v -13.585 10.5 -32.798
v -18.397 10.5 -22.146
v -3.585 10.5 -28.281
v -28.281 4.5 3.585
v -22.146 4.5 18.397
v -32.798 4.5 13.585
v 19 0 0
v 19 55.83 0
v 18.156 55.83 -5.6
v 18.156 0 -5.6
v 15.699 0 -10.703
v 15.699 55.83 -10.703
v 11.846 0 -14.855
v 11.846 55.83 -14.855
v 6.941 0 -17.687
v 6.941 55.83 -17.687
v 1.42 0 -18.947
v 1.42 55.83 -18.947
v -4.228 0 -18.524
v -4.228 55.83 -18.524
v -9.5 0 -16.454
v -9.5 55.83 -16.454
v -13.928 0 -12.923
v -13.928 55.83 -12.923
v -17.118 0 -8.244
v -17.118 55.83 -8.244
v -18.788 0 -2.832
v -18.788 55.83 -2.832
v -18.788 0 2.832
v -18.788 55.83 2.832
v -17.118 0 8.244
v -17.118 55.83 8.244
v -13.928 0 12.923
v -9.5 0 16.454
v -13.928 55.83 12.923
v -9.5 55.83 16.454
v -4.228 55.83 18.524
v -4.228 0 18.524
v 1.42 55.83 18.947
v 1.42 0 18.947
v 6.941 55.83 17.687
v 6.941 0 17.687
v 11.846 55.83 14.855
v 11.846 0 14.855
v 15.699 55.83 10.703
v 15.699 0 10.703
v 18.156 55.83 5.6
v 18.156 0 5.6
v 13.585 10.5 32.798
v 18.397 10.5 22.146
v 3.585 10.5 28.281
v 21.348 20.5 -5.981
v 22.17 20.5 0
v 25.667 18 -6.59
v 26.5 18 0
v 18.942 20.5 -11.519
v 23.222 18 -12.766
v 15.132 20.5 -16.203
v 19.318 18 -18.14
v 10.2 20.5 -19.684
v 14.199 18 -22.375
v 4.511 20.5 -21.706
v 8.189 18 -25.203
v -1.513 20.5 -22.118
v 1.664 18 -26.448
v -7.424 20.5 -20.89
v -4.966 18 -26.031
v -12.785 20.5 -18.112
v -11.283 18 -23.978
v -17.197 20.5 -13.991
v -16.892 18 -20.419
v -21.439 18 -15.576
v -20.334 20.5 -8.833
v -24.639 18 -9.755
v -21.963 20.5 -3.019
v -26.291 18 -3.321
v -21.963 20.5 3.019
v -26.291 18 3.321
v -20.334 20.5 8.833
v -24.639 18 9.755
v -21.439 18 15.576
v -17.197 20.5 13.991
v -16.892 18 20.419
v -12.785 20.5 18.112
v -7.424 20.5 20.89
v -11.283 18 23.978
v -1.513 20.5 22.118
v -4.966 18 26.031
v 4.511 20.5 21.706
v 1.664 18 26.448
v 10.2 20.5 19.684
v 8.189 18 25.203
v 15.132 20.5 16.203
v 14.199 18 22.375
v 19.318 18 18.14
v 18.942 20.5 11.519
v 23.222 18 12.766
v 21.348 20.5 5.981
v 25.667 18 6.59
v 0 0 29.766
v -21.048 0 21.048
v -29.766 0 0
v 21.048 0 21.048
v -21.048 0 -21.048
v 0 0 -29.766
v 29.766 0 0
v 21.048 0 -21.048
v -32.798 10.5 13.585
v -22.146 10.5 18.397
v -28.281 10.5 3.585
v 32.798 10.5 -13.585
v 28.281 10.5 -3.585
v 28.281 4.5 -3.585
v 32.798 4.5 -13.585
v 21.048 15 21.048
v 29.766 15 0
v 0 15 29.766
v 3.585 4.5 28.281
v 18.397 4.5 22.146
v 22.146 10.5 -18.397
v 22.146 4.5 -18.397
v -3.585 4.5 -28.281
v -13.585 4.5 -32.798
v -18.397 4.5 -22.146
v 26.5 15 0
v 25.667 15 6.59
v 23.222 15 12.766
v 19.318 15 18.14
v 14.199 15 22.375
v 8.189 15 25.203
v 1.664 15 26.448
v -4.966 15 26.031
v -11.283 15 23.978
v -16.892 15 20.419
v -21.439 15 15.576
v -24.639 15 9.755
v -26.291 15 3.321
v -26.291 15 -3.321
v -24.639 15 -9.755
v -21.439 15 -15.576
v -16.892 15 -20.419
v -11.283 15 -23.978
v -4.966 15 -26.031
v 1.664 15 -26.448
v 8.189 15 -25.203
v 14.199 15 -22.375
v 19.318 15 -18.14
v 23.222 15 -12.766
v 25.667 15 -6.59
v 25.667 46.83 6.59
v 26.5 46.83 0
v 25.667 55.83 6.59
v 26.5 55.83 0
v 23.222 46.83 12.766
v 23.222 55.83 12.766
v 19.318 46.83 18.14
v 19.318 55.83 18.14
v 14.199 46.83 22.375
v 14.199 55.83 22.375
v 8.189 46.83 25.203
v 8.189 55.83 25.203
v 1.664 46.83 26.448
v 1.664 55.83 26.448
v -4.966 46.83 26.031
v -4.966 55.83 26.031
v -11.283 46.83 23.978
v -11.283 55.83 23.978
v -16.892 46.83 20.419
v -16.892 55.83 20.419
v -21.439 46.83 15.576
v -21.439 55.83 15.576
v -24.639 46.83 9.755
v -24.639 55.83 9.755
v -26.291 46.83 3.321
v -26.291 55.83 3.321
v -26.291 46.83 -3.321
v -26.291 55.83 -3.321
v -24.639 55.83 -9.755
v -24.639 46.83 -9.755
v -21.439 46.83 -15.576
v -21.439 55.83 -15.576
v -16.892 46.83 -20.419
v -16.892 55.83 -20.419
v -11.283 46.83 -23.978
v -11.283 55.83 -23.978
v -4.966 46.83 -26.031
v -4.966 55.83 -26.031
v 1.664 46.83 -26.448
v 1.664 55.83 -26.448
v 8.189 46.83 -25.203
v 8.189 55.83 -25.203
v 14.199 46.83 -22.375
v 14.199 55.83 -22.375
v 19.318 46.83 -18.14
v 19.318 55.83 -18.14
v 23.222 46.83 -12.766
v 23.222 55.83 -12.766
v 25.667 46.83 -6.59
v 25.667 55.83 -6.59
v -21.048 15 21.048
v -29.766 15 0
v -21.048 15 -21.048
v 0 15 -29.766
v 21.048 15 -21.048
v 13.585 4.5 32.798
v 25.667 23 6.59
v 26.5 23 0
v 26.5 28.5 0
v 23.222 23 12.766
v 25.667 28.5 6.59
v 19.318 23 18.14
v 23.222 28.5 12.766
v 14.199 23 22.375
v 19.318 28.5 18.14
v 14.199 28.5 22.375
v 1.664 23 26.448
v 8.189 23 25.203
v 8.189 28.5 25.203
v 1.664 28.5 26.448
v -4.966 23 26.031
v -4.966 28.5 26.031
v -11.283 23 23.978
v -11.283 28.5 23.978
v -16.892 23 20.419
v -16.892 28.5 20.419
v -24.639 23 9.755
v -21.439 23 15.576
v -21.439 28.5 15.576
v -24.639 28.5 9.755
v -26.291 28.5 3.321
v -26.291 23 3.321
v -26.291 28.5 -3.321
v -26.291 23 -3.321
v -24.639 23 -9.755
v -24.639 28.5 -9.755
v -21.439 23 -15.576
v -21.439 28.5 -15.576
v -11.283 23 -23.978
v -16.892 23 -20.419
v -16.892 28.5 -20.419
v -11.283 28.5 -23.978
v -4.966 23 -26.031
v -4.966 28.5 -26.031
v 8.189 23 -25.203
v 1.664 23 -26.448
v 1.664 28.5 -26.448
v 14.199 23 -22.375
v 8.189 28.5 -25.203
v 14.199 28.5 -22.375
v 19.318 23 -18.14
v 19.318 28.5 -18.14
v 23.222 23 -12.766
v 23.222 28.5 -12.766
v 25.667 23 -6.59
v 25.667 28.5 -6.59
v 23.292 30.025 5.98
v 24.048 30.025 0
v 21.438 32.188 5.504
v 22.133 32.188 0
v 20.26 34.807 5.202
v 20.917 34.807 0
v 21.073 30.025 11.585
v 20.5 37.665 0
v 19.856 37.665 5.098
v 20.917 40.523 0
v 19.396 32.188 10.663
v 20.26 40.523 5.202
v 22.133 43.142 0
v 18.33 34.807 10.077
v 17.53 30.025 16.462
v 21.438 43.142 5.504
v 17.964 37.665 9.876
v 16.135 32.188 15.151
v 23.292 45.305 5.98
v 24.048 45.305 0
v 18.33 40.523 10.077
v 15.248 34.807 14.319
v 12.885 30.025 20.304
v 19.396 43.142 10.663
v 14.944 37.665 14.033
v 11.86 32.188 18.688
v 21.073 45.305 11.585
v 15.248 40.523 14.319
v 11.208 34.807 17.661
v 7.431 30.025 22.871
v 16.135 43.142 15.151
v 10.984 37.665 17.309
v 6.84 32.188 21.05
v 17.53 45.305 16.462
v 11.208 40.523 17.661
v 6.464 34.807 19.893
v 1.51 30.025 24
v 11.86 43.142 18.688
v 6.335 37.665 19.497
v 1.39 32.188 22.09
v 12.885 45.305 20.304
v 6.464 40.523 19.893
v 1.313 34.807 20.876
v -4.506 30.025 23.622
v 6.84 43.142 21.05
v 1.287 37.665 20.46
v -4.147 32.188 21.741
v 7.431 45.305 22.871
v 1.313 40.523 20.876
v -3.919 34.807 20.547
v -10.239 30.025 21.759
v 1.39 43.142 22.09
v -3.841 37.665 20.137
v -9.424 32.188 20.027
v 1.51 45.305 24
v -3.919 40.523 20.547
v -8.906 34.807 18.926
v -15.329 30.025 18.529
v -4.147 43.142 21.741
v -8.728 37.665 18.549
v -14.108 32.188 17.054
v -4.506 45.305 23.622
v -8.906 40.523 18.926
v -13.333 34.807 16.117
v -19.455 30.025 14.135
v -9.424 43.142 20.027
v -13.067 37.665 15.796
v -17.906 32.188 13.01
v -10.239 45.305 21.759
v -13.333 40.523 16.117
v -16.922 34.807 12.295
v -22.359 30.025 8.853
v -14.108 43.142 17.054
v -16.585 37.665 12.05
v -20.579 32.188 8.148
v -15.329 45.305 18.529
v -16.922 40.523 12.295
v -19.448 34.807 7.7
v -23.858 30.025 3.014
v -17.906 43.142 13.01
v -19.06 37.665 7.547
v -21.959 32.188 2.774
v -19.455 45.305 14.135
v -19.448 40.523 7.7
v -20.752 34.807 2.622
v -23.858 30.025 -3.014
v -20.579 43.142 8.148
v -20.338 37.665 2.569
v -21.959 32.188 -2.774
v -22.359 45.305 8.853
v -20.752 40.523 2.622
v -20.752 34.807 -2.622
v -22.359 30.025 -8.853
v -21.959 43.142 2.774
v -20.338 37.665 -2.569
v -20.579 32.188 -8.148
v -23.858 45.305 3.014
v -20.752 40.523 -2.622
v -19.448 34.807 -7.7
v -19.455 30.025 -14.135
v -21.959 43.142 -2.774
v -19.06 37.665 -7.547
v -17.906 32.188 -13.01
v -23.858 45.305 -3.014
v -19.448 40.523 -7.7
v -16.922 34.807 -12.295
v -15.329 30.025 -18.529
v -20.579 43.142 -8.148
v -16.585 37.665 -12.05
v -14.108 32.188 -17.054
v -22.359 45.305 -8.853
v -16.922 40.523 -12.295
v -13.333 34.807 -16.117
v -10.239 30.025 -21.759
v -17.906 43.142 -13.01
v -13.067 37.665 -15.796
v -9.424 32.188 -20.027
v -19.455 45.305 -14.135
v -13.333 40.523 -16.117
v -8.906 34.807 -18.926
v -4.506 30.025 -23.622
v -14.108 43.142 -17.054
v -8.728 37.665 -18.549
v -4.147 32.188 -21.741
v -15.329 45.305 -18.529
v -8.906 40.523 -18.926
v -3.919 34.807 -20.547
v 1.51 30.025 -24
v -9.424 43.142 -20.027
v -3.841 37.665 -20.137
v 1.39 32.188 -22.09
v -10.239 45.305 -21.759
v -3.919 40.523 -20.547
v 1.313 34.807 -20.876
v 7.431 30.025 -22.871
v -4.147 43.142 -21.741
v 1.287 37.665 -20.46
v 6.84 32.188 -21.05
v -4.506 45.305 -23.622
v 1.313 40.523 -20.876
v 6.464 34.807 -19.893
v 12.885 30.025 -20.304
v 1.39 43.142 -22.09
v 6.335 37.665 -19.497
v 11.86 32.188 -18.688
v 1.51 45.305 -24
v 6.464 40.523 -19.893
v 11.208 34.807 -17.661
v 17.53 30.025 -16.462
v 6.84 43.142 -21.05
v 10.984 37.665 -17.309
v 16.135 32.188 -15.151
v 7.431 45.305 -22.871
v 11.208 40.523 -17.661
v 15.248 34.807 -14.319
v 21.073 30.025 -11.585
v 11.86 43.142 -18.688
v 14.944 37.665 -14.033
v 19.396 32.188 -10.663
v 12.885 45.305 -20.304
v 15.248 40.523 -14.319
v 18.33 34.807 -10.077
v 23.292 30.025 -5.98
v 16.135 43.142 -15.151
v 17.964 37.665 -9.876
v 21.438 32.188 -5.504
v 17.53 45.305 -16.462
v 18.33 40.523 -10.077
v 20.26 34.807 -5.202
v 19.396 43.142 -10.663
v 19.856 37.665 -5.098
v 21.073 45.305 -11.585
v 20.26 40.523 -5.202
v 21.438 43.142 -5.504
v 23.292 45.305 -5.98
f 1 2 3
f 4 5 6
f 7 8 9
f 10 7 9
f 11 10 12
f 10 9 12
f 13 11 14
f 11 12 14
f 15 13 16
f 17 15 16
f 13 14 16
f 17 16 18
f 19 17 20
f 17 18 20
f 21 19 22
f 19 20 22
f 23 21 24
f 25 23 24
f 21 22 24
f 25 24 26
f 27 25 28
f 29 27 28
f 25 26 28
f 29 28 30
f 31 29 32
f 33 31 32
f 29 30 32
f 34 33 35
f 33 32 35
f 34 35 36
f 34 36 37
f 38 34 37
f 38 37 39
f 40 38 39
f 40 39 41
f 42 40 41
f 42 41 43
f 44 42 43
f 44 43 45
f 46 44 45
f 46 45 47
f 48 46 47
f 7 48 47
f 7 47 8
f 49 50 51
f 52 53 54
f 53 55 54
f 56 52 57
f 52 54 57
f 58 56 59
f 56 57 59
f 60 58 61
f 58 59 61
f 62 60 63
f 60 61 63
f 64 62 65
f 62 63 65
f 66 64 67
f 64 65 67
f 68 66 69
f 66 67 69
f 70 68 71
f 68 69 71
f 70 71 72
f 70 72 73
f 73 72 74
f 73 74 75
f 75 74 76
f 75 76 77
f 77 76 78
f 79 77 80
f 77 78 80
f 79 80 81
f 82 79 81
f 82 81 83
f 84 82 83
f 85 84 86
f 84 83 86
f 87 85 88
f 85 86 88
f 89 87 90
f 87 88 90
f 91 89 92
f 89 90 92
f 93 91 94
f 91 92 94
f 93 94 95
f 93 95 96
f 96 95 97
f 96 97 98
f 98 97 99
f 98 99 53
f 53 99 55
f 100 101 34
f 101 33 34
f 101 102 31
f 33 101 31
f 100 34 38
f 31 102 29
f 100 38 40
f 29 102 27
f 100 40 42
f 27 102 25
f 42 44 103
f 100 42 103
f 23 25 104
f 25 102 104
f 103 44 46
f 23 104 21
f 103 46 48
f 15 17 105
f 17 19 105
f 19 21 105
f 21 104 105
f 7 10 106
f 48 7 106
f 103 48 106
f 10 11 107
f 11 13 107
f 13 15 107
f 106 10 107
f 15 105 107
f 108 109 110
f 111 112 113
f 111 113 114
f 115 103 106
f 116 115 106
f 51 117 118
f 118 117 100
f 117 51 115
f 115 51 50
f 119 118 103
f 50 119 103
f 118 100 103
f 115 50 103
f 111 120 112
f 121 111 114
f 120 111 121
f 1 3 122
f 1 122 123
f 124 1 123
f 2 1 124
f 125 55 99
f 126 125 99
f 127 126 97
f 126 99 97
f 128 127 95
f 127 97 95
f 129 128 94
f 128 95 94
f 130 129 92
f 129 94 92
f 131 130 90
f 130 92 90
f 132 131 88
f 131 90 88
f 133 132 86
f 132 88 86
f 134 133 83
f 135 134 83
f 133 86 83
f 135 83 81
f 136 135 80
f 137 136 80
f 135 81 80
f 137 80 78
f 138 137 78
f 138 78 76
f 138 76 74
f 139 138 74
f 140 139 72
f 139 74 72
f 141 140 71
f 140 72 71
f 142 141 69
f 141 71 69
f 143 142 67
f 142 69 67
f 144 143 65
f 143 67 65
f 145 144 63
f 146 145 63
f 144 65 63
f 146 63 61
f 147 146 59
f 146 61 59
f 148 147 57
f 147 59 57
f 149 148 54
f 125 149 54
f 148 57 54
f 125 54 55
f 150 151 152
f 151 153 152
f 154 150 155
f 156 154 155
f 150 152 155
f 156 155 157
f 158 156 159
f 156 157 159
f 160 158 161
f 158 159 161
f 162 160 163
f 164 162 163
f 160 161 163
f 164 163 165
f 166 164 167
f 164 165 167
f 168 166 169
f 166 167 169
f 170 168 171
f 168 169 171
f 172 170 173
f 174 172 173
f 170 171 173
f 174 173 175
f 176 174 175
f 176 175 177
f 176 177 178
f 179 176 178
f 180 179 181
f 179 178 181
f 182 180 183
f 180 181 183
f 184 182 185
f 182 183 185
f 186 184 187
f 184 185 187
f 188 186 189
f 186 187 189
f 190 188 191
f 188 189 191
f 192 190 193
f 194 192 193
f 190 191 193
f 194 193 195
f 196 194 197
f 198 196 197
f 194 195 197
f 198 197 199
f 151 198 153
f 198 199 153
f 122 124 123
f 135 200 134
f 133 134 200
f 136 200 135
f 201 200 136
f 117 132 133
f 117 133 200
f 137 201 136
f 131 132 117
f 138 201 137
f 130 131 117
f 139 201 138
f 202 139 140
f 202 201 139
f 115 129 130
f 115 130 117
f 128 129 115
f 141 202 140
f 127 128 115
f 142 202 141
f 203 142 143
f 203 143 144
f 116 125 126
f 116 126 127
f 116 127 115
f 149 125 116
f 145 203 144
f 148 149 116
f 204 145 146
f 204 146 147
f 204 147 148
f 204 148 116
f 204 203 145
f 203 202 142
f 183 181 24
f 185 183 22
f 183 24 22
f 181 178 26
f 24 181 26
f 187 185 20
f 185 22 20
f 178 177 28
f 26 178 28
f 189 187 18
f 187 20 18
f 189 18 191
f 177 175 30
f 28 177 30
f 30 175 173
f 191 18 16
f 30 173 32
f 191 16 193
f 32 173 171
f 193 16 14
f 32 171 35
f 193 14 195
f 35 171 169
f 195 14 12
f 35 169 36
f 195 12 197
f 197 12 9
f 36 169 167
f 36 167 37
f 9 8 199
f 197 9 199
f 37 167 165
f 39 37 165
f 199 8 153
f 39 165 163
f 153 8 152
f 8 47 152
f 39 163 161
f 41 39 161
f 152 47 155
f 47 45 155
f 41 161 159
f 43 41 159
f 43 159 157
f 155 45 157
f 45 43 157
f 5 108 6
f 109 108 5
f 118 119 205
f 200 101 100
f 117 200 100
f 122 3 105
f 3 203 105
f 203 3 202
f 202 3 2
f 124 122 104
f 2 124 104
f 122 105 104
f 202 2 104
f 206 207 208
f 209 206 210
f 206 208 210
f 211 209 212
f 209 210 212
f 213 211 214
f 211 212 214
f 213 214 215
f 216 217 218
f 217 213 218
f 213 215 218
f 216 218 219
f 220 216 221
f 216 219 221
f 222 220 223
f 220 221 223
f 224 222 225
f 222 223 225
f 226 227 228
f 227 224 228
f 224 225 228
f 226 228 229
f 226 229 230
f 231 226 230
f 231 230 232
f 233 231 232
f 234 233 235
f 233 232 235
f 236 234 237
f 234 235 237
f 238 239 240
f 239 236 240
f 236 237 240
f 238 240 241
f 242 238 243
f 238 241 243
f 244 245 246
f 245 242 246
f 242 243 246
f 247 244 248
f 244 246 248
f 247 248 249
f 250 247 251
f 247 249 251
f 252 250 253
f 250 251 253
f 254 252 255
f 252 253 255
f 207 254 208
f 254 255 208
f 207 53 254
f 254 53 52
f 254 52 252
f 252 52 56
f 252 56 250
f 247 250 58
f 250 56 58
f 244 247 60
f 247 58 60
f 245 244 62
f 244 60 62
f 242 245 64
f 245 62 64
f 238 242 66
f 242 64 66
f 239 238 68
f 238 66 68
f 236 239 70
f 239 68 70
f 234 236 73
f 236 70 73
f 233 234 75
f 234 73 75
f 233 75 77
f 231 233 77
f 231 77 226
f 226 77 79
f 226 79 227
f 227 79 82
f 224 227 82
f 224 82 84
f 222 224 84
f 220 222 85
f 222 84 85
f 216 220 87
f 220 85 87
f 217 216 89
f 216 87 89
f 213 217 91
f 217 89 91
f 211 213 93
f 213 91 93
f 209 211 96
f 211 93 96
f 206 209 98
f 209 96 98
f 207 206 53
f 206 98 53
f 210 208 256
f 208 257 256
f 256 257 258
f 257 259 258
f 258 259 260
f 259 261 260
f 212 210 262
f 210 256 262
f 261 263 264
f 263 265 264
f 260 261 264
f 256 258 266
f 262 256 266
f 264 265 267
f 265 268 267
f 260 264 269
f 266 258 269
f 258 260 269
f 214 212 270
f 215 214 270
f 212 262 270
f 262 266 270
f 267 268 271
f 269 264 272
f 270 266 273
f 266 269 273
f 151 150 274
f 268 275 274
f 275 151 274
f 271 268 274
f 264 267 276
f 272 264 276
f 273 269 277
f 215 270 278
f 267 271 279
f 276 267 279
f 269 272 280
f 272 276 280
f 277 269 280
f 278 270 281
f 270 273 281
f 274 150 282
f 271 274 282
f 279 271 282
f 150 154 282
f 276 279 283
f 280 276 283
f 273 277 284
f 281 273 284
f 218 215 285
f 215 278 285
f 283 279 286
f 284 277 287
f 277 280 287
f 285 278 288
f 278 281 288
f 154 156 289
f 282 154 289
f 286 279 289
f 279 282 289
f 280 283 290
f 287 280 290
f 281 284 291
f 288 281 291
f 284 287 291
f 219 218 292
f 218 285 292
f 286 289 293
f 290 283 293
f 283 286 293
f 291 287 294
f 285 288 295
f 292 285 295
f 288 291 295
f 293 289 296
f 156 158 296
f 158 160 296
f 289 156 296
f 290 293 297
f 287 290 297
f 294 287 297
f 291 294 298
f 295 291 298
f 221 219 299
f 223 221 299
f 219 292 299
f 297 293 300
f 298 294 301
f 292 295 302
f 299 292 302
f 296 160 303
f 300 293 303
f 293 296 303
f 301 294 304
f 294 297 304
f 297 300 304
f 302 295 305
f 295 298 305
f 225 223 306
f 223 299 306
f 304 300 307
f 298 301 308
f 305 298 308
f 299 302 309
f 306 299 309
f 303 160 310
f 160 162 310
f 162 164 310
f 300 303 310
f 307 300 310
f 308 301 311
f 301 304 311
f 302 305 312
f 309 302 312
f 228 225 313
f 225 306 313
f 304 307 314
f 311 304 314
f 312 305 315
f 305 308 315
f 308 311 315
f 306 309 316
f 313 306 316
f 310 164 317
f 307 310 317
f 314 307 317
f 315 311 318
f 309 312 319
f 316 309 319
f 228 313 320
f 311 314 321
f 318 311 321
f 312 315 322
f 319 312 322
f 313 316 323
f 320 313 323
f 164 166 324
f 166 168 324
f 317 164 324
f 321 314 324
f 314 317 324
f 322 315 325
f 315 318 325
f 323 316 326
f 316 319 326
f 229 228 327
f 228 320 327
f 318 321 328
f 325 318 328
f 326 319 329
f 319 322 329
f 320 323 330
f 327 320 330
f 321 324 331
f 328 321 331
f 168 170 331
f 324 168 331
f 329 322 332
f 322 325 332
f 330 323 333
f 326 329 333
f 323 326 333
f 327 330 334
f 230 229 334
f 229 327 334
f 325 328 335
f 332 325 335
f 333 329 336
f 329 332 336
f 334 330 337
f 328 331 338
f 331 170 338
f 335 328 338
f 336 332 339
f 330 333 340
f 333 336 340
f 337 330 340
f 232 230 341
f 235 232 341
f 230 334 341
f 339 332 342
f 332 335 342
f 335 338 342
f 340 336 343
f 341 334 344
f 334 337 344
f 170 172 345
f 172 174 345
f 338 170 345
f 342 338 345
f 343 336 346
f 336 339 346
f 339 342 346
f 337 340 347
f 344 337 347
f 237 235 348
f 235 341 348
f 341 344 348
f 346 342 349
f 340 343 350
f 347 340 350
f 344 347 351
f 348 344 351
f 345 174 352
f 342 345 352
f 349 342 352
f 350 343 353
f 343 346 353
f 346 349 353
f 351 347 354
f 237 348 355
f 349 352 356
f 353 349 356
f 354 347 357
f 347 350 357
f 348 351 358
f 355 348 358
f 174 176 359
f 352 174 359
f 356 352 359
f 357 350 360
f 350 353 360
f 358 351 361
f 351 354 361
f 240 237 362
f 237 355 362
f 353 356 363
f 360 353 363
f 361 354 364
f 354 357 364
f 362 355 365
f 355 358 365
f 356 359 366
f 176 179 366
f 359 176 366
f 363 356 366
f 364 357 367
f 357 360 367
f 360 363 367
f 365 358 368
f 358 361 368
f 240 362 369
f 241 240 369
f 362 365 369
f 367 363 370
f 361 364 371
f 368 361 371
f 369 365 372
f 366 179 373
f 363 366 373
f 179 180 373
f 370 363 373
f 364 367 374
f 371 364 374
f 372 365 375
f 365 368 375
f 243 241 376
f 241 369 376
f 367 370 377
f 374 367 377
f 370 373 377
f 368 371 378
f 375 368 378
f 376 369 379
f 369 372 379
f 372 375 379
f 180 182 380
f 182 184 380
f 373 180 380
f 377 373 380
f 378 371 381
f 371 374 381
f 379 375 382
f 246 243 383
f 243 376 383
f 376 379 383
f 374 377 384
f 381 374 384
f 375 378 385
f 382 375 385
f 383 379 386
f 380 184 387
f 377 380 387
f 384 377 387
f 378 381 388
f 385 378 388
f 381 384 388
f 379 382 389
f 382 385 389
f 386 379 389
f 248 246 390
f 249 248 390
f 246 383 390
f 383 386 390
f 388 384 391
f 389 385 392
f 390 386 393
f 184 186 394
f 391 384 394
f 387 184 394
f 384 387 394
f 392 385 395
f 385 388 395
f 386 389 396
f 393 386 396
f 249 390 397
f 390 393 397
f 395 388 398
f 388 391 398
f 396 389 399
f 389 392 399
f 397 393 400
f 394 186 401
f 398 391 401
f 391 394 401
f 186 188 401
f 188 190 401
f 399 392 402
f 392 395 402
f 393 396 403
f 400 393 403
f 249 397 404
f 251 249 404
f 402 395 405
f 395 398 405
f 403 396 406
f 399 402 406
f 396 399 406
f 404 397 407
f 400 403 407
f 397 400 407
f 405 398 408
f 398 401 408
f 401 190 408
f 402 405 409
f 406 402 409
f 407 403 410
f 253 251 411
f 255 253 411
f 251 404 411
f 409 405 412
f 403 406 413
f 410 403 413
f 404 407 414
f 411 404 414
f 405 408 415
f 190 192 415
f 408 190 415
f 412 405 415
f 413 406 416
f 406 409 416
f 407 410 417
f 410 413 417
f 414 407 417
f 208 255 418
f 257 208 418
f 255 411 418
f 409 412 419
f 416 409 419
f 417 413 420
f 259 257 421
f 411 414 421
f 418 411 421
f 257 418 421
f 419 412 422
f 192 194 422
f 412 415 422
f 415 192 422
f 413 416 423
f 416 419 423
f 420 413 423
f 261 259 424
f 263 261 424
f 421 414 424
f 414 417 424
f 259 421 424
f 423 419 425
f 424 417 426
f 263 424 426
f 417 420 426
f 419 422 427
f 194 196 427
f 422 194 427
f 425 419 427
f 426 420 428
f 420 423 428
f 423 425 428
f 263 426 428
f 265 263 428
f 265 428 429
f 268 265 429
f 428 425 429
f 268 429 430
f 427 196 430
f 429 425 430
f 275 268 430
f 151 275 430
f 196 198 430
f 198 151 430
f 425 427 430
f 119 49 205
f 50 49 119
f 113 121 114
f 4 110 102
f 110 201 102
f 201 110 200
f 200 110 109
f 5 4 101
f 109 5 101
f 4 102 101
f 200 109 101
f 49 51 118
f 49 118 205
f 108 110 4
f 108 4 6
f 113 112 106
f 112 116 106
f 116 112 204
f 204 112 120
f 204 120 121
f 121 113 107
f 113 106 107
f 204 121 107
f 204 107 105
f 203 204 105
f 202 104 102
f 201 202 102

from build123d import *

# Parameters (mm, degrees)
SKETCH1_R           = 19
BOSS_EXTRUDE2_DEPTH = 15
SKETCH3_R           = 19
CUT_EXTRUDE1_DEPTH  = 56.83030278
BOSS_EXTRUDE3_DEPTH = 3
CIRPATTERN1_COUNT   = 4


with BuildPart() as part:
    # Sketch1 → Boss-Extrude2 (new body)
    with BuildSketch(Plane(origin=(0, 0, 0), x_dir=(1, 0, 0), z_dir=(0, 1, 0))):
        Polygon((21.04758878, 21.04758878), (0, 29.765785508), (-21.04758878, 21.04758878), (-29.765785508, 0), (-21.04758878, -21.04758878), (0, -29.765785508), (21.04758878, -21.04758878), (29.765785508, 0), align=None)
        Circle(SKETCH1_R, mode=Mode.SUBTRACT)
    extrude(amount=BOSS_EXTRUDE2_DEPTH)

    # Sketch2 → Revolve2 (revolve)
    with BuildSketch(Plane.XY):
        with BuildLine():
            Line((26.5, 46.83030278), (26.5, 55.83030278))
            Line((26.5, 55.83030278), (0, 55.83030278))
            Line((0, 55.83030278), (0, 15))
            Line((0, 15), (26.5, 15))
            Line((26.5, 15), (26.5, 28.5))
            ThreePointArc((26.5, 28.5), (20.5, 37.66515139), (26.5, 46.83030278))
        make_face()
    revolve(axis=Axis((0, 102.251774254, 0), (0, -1, 0)))

    # Sketch3 → Cut-Extrude1 (cut, through all)
    with BuildSketch(Plane(origin=(0, 55.83030278, 0), x_dir=(1, 0, 0), z_dir=(0, 1, 0))):
        Circle(SKETCH3_R)
    extrude(amount=-CUT_EXTRUDE1_DEPTH, mode=Mode.SUBTRACT)

    # Sketch4 → Boss-Extrude3 (add, symmetric)
    with BuildSketch(Plane(origin=(0, 7.5, 0), x_dir=(1, 0, 0), z_dir=(0, 1, 0))):
        Polygon((22.145562855, 18.396844877), (28.280721426, 3.585261849), (32.797723404, 13.585261849), align=None)
    boss_extrude3 = extrude(amount=BOSS_EXTRUDE3_DEPTH, both=True)

    # Sketch6 → Cut-Revolve1 (revolve, cut)
    with BuildSketch(Plane.XY):
        Polygon((26.5, 23), (22.169872981, 20.5), (26.5, 18), align=None)
    revolve(axis=Axis((0, -19.954319923, 0), (0, 1, 0)), mode=Mode.SUBTRACT)

    # CirPattern1: Boss-Extrude3 ×4 about axis
    cirpattern1_axis = Axis((0, 0, 0), (0, 1, 0))
    for i in range(1, CIRPATTERN1_COUNT):
        add(boss_extrude3.rotate(cirpattern1_axis, i * 360 / CIRPATTERN1_COUNT))


solid = part.part
